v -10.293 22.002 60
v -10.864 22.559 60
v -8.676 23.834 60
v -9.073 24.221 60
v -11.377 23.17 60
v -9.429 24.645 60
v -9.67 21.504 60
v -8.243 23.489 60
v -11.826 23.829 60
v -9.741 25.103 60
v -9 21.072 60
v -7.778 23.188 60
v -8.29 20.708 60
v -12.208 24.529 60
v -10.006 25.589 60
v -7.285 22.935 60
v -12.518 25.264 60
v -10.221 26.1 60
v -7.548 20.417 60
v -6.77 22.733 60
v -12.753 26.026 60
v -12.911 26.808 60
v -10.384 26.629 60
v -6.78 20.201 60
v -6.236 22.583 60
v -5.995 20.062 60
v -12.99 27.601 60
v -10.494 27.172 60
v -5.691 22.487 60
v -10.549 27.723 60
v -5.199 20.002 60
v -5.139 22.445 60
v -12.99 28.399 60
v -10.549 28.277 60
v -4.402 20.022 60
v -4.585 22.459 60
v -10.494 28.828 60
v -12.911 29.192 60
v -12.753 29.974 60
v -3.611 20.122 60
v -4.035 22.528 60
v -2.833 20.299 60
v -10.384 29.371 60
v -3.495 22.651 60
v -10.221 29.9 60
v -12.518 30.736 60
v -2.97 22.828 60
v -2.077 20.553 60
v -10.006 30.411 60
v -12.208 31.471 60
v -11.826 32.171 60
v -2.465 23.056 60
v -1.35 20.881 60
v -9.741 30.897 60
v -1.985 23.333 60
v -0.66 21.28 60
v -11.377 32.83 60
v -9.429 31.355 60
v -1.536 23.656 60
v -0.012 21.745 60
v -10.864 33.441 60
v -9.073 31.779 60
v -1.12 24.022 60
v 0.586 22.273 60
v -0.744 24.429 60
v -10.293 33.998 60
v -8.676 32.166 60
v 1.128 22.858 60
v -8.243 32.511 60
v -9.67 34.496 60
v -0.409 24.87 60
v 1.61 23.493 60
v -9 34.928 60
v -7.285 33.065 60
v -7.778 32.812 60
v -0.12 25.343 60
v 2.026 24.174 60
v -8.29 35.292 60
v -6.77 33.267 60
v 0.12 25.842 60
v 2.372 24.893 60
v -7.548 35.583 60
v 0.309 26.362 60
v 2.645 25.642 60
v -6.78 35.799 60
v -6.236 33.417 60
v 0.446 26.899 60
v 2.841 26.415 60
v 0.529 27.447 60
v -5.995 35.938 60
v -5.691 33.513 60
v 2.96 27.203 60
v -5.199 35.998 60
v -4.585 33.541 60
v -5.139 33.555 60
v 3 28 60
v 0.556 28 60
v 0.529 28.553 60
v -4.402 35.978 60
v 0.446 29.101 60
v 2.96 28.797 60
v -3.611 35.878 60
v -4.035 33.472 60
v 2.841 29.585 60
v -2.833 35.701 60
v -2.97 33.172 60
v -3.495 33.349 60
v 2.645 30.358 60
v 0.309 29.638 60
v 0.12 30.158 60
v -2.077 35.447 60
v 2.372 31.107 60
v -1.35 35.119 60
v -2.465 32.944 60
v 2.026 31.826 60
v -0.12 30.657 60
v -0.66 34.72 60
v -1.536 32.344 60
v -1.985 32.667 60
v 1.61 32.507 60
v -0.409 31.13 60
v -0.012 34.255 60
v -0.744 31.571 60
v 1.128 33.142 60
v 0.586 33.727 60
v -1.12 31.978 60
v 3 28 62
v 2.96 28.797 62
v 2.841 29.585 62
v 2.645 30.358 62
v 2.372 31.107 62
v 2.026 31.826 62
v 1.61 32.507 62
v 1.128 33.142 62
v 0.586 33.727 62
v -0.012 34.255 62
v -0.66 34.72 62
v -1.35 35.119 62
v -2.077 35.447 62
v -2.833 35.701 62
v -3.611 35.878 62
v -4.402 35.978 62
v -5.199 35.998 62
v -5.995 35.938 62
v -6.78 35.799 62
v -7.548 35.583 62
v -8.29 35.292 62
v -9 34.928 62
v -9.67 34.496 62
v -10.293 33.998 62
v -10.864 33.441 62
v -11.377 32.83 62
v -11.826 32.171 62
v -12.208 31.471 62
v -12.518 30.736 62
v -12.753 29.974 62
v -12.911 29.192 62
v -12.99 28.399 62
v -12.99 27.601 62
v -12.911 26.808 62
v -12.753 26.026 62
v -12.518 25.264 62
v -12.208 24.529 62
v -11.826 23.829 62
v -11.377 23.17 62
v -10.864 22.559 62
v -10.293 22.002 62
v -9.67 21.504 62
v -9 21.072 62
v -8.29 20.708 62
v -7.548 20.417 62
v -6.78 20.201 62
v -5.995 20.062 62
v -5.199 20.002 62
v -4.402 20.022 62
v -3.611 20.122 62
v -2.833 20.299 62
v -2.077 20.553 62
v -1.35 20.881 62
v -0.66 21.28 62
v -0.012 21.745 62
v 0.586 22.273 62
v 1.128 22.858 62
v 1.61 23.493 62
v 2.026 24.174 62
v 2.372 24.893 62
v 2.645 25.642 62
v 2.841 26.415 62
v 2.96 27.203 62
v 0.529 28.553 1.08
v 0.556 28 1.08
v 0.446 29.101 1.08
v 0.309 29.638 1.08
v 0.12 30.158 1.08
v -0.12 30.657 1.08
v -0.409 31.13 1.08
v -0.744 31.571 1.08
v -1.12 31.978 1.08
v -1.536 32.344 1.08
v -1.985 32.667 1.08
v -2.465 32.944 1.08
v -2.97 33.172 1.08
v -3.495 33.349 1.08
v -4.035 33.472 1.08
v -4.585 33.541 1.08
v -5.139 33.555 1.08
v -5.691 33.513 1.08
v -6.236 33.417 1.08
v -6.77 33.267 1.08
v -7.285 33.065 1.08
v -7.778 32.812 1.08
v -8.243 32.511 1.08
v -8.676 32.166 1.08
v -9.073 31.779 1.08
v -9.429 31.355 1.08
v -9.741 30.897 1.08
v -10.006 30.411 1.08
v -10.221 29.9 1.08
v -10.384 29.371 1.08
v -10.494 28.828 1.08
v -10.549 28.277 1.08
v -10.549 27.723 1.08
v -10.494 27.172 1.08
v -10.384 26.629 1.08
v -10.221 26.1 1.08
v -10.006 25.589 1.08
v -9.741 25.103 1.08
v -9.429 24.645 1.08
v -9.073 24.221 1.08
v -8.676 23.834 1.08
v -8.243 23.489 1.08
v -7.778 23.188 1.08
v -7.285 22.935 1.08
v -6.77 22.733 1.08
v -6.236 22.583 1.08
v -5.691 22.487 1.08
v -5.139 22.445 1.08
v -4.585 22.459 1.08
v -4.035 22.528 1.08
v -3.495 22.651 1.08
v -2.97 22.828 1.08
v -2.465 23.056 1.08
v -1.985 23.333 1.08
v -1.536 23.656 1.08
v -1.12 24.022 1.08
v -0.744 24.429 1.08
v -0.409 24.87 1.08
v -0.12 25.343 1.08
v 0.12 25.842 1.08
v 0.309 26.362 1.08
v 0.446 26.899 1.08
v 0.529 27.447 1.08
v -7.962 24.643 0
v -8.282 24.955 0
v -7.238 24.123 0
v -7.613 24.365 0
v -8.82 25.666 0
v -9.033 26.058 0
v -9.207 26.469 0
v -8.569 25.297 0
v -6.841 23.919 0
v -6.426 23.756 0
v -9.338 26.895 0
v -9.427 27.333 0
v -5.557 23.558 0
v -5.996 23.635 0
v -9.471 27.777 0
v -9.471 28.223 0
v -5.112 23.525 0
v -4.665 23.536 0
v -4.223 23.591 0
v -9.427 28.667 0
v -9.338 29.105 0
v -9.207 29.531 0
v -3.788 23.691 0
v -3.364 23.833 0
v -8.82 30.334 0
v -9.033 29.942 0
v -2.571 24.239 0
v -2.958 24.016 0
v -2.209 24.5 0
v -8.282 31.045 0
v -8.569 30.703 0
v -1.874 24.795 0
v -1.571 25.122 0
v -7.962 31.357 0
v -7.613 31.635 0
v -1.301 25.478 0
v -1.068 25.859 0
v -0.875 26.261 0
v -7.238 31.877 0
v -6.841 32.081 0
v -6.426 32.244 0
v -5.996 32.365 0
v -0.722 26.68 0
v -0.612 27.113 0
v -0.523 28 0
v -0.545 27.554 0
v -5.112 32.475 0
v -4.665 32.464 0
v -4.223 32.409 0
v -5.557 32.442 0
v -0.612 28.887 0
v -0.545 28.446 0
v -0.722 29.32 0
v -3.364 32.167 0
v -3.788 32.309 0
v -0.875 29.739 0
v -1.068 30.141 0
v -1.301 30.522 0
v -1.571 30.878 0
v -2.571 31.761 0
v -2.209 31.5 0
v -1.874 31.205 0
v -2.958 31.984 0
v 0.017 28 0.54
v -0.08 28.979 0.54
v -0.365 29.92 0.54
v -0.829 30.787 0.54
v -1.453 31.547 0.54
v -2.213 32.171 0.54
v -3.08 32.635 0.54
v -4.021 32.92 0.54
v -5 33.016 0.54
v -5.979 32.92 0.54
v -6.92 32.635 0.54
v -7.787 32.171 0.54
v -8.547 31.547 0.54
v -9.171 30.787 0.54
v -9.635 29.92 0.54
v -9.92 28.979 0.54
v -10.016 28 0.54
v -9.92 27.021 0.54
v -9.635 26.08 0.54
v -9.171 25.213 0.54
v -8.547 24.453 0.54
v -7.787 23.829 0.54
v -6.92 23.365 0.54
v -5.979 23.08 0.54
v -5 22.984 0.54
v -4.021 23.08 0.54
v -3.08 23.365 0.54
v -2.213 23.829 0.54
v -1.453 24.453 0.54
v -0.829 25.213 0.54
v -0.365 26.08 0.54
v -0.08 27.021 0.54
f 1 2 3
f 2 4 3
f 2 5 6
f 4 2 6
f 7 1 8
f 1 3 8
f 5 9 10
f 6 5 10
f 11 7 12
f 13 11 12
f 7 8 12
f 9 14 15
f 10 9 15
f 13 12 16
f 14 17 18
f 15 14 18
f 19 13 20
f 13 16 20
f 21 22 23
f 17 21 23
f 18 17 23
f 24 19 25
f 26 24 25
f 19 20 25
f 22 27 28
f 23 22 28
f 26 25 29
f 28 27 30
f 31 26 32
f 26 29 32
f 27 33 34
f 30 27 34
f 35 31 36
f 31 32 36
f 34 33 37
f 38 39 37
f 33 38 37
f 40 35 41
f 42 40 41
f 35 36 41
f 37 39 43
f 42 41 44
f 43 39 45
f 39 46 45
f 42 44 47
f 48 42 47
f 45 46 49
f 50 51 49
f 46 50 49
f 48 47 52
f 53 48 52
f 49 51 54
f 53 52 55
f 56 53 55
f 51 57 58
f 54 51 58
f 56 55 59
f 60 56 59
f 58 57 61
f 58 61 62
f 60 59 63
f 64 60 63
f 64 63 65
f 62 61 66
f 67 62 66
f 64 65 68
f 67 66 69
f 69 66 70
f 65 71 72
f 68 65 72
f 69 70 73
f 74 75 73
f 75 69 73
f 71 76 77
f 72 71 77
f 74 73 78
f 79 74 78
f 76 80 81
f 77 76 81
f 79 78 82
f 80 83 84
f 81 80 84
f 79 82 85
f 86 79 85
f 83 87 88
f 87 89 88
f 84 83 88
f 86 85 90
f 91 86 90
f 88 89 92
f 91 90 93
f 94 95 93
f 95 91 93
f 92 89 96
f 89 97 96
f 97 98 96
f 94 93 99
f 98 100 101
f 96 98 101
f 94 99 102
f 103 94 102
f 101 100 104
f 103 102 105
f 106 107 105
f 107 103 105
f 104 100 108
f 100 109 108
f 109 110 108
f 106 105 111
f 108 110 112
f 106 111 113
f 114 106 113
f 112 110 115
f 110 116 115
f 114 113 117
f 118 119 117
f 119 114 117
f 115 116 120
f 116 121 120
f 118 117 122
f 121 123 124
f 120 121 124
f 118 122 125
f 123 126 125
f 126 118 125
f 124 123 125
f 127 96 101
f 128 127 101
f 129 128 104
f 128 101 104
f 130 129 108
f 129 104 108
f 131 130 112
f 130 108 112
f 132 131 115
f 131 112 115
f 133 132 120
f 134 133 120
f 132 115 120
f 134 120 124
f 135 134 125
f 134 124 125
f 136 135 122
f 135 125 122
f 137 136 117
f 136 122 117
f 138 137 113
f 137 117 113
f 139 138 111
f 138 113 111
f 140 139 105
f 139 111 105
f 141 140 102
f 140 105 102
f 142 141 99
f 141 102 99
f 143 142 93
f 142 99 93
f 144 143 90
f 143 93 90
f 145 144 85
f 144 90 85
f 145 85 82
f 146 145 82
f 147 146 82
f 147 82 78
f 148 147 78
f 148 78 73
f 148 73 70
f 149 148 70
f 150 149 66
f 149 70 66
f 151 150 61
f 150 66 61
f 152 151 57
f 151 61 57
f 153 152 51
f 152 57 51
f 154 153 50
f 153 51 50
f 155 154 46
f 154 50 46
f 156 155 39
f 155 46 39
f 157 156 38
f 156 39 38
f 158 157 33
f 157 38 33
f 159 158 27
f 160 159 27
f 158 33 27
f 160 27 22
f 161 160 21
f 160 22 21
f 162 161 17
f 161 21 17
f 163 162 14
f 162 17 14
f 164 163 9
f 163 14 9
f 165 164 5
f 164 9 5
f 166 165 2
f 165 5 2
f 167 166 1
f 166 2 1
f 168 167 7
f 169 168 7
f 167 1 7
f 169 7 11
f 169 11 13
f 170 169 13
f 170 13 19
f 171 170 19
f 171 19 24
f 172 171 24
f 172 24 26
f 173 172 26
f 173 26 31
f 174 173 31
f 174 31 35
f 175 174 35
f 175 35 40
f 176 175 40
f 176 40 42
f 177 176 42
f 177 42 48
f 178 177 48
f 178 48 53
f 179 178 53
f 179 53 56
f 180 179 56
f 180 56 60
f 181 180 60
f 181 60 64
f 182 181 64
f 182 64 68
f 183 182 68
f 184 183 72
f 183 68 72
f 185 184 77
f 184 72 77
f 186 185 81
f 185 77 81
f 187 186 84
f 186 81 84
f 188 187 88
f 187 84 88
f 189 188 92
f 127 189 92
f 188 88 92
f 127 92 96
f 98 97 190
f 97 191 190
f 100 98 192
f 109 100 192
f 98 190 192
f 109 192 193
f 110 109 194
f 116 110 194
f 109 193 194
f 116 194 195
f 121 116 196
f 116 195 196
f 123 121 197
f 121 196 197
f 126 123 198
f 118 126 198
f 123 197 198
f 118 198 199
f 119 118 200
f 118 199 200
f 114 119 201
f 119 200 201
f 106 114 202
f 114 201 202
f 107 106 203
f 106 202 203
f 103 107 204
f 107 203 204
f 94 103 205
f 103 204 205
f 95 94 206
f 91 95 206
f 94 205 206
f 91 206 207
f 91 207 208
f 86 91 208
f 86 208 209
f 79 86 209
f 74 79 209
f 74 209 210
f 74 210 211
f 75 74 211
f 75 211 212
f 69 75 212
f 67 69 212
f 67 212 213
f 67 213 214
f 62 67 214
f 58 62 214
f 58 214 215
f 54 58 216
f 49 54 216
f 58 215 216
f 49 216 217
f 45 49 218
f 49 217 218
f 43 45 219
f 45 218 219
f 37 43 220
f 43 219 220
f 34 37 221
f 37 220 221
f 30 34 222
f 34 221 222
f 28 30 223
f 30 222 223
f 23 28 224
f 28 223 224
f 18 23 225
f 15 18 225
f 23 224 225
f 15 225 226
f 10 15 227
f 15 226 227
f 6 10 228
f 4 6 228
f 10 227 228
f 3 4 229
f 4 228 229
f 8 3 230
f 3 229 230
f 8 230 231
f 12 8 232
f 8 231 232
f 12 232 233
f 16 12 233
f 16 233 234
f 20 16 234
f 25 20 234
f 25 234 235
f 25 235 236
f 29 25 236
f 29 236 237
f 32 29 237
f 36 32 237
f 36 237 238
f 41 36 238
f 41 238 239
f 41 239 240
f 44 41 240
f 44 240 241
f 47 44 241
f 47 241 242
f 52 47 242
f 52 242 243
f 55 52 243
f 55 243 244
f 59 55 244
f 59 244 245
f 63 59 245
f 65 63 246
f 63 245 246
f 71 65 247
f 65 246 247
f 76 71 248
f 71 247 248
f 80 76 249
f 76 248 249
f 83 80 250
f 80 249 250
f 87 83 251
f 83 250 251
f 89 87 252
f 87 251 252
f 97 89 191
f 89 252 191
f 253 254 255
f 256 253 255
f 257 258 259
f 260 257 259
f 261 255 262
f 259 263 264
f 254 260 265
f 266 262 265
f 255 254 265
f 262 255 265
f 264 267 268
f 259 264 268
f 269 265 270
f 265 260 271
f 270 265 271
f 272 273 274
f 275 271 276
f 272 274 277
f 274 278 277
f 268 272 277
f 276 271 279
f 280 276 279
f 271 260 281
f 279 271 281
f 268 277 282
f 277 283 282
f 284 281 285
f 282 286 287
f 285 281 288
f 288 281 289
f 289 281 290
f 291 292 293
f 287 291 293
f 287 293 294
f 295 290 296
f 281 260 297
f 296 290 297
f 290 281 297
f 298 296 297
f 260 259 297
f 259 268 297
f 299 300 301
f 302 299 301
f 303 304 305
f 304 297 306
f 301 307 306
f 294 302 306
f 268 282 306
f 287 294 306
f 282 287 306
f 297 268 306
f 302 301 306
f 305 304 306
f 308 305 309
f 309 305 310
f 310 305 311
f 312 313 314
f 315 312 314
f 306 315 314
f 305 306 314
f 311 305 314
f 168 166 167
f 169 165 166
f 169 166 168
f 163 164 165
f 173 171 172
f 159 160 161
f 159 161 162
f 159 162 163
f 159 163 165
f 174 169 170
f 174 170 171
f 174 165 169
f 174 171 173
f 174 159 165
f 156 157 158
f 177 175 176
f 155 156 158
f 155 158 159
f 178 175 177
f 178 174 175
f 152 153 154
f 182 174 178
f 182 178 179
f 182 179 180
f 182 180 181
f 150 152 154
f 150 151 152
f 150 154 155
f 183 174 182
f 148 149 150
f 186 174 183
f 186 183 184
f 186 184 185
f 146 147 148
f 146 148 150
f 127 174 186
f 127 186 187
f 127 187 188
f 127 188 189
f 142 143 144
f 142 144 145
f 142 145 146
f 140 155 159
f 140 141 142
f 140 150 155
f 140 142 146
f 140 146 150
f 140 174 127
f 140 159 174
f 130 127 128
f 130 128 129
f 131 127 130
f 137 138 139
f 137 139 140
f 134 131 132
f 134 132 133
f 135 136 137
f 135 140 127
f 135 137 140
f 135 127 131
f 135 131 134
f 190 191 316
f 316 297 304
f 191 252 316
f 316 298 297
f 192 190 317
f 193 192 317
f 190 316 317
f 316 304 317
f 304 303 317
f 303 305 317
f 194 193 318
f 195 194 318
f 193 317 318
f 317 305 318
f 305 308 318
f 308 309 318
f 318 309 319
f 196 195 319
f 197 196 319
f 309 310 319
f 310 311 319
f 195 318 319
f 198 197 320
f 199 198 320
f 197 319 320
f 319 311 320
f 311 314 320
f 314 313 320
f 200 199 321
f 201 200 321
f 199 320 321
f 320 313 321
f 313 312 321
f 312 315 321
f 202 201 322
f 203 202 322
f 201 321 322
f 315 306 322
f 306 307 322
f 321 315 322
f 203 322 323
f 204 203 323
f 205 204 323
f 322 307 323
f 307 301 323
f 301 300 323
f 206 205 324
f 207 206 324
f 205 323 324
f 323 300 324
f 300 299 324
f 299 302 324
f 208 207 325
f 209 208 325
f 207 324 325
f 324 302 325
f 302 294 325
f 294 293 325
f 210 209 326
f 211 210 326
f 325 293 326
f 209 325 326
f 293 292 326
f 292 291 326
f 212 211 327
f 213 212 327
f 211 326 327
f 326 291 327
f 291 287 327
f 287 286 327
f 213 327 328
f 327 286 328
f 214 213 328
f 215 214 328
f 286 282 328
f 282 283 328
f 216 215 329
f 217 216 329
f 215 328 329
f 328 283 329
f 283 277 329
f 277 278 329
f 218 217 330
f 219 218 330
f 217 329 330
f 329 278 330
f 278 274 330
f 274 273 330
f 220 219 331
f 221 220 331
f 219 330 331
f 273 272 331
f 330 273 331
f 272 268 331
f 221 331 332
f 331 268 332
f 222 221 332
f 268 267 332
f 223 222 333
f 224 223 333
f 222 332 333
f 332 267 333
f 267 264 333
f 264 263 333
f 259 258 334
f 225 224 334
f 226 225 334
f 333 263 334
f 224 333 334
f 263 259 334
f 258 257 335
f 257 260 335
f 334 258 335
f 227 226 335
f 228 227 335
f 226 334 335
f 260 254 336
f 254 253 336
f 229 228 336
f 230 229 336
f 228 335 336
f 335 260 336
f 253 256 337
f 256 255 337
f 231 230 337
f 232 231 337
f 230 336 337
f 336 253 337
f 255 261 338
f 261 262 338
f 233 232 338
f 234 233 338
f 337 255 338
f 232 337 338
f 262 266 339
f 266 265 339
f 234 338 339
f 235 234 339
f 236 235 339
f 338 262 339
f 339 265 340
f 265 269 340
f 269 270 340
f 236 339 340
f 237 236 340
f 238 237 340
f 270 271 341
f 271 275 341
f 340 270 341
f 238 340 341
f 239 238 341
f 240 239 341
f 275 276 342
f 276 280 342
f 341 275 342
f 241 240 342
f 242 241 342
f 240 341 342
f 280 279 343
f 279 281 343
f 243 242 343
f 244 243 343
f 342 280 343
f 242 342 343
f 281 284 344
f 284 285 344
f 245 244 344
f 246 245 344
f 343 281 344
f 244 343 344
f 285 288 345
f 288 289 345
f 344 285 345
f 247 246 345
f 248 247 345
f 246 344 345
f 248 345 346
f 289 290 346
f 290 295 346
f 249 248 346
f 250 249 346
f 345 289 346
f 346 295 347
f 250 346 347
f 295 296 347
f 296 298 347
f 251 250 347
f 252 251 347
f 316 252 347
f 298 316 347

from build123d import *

# Parameters (mm, degrees)
SKETCH_1_R      = 6
EXTRUDE_1_DEPTH = 40
SKETCH_1_4_R    = 6
EXTRUDE_3_DEPTH = 60
SKETCH_2_R      = 8
EXTRUDE_4_DEPTH = 2


# Read off the part's stored shape, not the designer's step: 7/16-14 机械螺纹 螺柱1
with BuildPart() as part:
    # 草图1 → 凸台-拉伸1 (new body)
    with BuildSketch(Plane.XY):
        with Locations((-5, 28)):
            Circle(SKETCH_1_R)
    extrude(amount=EXTRUDE_1_DEPTH)

    # 草图1<4> → 凸台-拉伸3 (add)
    with BuildSketch(Plane.XY):
        with Locations((-5, 28)):
            Circle(SKETCH_1_4_R)
    extrude(amount=EXTRUDE_3_DEPTH)

    # 草图2 → 凸台-拉伸4 (add)
    with BuildSketch(Plane.XY.offset(60)):
        with Locations((-5, 28)):
            Circle(SKETCH_2_R)
    extrude(amount=EXTRUDE_4_DEPTH)

    # 7/16-14 机械螺纹 螺柱1 outline → 7/16-14 机械螺纹 螺柱1 (revolve, cut)
    with BuildSketch(Plane(origin=(-5, 28, 0), x_dir=(1, 0, 0), z_dir=(0, -1, 0))):
        Polygon((4.47675, 0), (6, 0), (6, 60), (5.55625, 60), (5.55625, 1.0795), align=None)
    revolve(axis=Axis((-5, 28, 0), (0, 0, 1)), mode=Mode.SUBTRACT)


solid = part.part
